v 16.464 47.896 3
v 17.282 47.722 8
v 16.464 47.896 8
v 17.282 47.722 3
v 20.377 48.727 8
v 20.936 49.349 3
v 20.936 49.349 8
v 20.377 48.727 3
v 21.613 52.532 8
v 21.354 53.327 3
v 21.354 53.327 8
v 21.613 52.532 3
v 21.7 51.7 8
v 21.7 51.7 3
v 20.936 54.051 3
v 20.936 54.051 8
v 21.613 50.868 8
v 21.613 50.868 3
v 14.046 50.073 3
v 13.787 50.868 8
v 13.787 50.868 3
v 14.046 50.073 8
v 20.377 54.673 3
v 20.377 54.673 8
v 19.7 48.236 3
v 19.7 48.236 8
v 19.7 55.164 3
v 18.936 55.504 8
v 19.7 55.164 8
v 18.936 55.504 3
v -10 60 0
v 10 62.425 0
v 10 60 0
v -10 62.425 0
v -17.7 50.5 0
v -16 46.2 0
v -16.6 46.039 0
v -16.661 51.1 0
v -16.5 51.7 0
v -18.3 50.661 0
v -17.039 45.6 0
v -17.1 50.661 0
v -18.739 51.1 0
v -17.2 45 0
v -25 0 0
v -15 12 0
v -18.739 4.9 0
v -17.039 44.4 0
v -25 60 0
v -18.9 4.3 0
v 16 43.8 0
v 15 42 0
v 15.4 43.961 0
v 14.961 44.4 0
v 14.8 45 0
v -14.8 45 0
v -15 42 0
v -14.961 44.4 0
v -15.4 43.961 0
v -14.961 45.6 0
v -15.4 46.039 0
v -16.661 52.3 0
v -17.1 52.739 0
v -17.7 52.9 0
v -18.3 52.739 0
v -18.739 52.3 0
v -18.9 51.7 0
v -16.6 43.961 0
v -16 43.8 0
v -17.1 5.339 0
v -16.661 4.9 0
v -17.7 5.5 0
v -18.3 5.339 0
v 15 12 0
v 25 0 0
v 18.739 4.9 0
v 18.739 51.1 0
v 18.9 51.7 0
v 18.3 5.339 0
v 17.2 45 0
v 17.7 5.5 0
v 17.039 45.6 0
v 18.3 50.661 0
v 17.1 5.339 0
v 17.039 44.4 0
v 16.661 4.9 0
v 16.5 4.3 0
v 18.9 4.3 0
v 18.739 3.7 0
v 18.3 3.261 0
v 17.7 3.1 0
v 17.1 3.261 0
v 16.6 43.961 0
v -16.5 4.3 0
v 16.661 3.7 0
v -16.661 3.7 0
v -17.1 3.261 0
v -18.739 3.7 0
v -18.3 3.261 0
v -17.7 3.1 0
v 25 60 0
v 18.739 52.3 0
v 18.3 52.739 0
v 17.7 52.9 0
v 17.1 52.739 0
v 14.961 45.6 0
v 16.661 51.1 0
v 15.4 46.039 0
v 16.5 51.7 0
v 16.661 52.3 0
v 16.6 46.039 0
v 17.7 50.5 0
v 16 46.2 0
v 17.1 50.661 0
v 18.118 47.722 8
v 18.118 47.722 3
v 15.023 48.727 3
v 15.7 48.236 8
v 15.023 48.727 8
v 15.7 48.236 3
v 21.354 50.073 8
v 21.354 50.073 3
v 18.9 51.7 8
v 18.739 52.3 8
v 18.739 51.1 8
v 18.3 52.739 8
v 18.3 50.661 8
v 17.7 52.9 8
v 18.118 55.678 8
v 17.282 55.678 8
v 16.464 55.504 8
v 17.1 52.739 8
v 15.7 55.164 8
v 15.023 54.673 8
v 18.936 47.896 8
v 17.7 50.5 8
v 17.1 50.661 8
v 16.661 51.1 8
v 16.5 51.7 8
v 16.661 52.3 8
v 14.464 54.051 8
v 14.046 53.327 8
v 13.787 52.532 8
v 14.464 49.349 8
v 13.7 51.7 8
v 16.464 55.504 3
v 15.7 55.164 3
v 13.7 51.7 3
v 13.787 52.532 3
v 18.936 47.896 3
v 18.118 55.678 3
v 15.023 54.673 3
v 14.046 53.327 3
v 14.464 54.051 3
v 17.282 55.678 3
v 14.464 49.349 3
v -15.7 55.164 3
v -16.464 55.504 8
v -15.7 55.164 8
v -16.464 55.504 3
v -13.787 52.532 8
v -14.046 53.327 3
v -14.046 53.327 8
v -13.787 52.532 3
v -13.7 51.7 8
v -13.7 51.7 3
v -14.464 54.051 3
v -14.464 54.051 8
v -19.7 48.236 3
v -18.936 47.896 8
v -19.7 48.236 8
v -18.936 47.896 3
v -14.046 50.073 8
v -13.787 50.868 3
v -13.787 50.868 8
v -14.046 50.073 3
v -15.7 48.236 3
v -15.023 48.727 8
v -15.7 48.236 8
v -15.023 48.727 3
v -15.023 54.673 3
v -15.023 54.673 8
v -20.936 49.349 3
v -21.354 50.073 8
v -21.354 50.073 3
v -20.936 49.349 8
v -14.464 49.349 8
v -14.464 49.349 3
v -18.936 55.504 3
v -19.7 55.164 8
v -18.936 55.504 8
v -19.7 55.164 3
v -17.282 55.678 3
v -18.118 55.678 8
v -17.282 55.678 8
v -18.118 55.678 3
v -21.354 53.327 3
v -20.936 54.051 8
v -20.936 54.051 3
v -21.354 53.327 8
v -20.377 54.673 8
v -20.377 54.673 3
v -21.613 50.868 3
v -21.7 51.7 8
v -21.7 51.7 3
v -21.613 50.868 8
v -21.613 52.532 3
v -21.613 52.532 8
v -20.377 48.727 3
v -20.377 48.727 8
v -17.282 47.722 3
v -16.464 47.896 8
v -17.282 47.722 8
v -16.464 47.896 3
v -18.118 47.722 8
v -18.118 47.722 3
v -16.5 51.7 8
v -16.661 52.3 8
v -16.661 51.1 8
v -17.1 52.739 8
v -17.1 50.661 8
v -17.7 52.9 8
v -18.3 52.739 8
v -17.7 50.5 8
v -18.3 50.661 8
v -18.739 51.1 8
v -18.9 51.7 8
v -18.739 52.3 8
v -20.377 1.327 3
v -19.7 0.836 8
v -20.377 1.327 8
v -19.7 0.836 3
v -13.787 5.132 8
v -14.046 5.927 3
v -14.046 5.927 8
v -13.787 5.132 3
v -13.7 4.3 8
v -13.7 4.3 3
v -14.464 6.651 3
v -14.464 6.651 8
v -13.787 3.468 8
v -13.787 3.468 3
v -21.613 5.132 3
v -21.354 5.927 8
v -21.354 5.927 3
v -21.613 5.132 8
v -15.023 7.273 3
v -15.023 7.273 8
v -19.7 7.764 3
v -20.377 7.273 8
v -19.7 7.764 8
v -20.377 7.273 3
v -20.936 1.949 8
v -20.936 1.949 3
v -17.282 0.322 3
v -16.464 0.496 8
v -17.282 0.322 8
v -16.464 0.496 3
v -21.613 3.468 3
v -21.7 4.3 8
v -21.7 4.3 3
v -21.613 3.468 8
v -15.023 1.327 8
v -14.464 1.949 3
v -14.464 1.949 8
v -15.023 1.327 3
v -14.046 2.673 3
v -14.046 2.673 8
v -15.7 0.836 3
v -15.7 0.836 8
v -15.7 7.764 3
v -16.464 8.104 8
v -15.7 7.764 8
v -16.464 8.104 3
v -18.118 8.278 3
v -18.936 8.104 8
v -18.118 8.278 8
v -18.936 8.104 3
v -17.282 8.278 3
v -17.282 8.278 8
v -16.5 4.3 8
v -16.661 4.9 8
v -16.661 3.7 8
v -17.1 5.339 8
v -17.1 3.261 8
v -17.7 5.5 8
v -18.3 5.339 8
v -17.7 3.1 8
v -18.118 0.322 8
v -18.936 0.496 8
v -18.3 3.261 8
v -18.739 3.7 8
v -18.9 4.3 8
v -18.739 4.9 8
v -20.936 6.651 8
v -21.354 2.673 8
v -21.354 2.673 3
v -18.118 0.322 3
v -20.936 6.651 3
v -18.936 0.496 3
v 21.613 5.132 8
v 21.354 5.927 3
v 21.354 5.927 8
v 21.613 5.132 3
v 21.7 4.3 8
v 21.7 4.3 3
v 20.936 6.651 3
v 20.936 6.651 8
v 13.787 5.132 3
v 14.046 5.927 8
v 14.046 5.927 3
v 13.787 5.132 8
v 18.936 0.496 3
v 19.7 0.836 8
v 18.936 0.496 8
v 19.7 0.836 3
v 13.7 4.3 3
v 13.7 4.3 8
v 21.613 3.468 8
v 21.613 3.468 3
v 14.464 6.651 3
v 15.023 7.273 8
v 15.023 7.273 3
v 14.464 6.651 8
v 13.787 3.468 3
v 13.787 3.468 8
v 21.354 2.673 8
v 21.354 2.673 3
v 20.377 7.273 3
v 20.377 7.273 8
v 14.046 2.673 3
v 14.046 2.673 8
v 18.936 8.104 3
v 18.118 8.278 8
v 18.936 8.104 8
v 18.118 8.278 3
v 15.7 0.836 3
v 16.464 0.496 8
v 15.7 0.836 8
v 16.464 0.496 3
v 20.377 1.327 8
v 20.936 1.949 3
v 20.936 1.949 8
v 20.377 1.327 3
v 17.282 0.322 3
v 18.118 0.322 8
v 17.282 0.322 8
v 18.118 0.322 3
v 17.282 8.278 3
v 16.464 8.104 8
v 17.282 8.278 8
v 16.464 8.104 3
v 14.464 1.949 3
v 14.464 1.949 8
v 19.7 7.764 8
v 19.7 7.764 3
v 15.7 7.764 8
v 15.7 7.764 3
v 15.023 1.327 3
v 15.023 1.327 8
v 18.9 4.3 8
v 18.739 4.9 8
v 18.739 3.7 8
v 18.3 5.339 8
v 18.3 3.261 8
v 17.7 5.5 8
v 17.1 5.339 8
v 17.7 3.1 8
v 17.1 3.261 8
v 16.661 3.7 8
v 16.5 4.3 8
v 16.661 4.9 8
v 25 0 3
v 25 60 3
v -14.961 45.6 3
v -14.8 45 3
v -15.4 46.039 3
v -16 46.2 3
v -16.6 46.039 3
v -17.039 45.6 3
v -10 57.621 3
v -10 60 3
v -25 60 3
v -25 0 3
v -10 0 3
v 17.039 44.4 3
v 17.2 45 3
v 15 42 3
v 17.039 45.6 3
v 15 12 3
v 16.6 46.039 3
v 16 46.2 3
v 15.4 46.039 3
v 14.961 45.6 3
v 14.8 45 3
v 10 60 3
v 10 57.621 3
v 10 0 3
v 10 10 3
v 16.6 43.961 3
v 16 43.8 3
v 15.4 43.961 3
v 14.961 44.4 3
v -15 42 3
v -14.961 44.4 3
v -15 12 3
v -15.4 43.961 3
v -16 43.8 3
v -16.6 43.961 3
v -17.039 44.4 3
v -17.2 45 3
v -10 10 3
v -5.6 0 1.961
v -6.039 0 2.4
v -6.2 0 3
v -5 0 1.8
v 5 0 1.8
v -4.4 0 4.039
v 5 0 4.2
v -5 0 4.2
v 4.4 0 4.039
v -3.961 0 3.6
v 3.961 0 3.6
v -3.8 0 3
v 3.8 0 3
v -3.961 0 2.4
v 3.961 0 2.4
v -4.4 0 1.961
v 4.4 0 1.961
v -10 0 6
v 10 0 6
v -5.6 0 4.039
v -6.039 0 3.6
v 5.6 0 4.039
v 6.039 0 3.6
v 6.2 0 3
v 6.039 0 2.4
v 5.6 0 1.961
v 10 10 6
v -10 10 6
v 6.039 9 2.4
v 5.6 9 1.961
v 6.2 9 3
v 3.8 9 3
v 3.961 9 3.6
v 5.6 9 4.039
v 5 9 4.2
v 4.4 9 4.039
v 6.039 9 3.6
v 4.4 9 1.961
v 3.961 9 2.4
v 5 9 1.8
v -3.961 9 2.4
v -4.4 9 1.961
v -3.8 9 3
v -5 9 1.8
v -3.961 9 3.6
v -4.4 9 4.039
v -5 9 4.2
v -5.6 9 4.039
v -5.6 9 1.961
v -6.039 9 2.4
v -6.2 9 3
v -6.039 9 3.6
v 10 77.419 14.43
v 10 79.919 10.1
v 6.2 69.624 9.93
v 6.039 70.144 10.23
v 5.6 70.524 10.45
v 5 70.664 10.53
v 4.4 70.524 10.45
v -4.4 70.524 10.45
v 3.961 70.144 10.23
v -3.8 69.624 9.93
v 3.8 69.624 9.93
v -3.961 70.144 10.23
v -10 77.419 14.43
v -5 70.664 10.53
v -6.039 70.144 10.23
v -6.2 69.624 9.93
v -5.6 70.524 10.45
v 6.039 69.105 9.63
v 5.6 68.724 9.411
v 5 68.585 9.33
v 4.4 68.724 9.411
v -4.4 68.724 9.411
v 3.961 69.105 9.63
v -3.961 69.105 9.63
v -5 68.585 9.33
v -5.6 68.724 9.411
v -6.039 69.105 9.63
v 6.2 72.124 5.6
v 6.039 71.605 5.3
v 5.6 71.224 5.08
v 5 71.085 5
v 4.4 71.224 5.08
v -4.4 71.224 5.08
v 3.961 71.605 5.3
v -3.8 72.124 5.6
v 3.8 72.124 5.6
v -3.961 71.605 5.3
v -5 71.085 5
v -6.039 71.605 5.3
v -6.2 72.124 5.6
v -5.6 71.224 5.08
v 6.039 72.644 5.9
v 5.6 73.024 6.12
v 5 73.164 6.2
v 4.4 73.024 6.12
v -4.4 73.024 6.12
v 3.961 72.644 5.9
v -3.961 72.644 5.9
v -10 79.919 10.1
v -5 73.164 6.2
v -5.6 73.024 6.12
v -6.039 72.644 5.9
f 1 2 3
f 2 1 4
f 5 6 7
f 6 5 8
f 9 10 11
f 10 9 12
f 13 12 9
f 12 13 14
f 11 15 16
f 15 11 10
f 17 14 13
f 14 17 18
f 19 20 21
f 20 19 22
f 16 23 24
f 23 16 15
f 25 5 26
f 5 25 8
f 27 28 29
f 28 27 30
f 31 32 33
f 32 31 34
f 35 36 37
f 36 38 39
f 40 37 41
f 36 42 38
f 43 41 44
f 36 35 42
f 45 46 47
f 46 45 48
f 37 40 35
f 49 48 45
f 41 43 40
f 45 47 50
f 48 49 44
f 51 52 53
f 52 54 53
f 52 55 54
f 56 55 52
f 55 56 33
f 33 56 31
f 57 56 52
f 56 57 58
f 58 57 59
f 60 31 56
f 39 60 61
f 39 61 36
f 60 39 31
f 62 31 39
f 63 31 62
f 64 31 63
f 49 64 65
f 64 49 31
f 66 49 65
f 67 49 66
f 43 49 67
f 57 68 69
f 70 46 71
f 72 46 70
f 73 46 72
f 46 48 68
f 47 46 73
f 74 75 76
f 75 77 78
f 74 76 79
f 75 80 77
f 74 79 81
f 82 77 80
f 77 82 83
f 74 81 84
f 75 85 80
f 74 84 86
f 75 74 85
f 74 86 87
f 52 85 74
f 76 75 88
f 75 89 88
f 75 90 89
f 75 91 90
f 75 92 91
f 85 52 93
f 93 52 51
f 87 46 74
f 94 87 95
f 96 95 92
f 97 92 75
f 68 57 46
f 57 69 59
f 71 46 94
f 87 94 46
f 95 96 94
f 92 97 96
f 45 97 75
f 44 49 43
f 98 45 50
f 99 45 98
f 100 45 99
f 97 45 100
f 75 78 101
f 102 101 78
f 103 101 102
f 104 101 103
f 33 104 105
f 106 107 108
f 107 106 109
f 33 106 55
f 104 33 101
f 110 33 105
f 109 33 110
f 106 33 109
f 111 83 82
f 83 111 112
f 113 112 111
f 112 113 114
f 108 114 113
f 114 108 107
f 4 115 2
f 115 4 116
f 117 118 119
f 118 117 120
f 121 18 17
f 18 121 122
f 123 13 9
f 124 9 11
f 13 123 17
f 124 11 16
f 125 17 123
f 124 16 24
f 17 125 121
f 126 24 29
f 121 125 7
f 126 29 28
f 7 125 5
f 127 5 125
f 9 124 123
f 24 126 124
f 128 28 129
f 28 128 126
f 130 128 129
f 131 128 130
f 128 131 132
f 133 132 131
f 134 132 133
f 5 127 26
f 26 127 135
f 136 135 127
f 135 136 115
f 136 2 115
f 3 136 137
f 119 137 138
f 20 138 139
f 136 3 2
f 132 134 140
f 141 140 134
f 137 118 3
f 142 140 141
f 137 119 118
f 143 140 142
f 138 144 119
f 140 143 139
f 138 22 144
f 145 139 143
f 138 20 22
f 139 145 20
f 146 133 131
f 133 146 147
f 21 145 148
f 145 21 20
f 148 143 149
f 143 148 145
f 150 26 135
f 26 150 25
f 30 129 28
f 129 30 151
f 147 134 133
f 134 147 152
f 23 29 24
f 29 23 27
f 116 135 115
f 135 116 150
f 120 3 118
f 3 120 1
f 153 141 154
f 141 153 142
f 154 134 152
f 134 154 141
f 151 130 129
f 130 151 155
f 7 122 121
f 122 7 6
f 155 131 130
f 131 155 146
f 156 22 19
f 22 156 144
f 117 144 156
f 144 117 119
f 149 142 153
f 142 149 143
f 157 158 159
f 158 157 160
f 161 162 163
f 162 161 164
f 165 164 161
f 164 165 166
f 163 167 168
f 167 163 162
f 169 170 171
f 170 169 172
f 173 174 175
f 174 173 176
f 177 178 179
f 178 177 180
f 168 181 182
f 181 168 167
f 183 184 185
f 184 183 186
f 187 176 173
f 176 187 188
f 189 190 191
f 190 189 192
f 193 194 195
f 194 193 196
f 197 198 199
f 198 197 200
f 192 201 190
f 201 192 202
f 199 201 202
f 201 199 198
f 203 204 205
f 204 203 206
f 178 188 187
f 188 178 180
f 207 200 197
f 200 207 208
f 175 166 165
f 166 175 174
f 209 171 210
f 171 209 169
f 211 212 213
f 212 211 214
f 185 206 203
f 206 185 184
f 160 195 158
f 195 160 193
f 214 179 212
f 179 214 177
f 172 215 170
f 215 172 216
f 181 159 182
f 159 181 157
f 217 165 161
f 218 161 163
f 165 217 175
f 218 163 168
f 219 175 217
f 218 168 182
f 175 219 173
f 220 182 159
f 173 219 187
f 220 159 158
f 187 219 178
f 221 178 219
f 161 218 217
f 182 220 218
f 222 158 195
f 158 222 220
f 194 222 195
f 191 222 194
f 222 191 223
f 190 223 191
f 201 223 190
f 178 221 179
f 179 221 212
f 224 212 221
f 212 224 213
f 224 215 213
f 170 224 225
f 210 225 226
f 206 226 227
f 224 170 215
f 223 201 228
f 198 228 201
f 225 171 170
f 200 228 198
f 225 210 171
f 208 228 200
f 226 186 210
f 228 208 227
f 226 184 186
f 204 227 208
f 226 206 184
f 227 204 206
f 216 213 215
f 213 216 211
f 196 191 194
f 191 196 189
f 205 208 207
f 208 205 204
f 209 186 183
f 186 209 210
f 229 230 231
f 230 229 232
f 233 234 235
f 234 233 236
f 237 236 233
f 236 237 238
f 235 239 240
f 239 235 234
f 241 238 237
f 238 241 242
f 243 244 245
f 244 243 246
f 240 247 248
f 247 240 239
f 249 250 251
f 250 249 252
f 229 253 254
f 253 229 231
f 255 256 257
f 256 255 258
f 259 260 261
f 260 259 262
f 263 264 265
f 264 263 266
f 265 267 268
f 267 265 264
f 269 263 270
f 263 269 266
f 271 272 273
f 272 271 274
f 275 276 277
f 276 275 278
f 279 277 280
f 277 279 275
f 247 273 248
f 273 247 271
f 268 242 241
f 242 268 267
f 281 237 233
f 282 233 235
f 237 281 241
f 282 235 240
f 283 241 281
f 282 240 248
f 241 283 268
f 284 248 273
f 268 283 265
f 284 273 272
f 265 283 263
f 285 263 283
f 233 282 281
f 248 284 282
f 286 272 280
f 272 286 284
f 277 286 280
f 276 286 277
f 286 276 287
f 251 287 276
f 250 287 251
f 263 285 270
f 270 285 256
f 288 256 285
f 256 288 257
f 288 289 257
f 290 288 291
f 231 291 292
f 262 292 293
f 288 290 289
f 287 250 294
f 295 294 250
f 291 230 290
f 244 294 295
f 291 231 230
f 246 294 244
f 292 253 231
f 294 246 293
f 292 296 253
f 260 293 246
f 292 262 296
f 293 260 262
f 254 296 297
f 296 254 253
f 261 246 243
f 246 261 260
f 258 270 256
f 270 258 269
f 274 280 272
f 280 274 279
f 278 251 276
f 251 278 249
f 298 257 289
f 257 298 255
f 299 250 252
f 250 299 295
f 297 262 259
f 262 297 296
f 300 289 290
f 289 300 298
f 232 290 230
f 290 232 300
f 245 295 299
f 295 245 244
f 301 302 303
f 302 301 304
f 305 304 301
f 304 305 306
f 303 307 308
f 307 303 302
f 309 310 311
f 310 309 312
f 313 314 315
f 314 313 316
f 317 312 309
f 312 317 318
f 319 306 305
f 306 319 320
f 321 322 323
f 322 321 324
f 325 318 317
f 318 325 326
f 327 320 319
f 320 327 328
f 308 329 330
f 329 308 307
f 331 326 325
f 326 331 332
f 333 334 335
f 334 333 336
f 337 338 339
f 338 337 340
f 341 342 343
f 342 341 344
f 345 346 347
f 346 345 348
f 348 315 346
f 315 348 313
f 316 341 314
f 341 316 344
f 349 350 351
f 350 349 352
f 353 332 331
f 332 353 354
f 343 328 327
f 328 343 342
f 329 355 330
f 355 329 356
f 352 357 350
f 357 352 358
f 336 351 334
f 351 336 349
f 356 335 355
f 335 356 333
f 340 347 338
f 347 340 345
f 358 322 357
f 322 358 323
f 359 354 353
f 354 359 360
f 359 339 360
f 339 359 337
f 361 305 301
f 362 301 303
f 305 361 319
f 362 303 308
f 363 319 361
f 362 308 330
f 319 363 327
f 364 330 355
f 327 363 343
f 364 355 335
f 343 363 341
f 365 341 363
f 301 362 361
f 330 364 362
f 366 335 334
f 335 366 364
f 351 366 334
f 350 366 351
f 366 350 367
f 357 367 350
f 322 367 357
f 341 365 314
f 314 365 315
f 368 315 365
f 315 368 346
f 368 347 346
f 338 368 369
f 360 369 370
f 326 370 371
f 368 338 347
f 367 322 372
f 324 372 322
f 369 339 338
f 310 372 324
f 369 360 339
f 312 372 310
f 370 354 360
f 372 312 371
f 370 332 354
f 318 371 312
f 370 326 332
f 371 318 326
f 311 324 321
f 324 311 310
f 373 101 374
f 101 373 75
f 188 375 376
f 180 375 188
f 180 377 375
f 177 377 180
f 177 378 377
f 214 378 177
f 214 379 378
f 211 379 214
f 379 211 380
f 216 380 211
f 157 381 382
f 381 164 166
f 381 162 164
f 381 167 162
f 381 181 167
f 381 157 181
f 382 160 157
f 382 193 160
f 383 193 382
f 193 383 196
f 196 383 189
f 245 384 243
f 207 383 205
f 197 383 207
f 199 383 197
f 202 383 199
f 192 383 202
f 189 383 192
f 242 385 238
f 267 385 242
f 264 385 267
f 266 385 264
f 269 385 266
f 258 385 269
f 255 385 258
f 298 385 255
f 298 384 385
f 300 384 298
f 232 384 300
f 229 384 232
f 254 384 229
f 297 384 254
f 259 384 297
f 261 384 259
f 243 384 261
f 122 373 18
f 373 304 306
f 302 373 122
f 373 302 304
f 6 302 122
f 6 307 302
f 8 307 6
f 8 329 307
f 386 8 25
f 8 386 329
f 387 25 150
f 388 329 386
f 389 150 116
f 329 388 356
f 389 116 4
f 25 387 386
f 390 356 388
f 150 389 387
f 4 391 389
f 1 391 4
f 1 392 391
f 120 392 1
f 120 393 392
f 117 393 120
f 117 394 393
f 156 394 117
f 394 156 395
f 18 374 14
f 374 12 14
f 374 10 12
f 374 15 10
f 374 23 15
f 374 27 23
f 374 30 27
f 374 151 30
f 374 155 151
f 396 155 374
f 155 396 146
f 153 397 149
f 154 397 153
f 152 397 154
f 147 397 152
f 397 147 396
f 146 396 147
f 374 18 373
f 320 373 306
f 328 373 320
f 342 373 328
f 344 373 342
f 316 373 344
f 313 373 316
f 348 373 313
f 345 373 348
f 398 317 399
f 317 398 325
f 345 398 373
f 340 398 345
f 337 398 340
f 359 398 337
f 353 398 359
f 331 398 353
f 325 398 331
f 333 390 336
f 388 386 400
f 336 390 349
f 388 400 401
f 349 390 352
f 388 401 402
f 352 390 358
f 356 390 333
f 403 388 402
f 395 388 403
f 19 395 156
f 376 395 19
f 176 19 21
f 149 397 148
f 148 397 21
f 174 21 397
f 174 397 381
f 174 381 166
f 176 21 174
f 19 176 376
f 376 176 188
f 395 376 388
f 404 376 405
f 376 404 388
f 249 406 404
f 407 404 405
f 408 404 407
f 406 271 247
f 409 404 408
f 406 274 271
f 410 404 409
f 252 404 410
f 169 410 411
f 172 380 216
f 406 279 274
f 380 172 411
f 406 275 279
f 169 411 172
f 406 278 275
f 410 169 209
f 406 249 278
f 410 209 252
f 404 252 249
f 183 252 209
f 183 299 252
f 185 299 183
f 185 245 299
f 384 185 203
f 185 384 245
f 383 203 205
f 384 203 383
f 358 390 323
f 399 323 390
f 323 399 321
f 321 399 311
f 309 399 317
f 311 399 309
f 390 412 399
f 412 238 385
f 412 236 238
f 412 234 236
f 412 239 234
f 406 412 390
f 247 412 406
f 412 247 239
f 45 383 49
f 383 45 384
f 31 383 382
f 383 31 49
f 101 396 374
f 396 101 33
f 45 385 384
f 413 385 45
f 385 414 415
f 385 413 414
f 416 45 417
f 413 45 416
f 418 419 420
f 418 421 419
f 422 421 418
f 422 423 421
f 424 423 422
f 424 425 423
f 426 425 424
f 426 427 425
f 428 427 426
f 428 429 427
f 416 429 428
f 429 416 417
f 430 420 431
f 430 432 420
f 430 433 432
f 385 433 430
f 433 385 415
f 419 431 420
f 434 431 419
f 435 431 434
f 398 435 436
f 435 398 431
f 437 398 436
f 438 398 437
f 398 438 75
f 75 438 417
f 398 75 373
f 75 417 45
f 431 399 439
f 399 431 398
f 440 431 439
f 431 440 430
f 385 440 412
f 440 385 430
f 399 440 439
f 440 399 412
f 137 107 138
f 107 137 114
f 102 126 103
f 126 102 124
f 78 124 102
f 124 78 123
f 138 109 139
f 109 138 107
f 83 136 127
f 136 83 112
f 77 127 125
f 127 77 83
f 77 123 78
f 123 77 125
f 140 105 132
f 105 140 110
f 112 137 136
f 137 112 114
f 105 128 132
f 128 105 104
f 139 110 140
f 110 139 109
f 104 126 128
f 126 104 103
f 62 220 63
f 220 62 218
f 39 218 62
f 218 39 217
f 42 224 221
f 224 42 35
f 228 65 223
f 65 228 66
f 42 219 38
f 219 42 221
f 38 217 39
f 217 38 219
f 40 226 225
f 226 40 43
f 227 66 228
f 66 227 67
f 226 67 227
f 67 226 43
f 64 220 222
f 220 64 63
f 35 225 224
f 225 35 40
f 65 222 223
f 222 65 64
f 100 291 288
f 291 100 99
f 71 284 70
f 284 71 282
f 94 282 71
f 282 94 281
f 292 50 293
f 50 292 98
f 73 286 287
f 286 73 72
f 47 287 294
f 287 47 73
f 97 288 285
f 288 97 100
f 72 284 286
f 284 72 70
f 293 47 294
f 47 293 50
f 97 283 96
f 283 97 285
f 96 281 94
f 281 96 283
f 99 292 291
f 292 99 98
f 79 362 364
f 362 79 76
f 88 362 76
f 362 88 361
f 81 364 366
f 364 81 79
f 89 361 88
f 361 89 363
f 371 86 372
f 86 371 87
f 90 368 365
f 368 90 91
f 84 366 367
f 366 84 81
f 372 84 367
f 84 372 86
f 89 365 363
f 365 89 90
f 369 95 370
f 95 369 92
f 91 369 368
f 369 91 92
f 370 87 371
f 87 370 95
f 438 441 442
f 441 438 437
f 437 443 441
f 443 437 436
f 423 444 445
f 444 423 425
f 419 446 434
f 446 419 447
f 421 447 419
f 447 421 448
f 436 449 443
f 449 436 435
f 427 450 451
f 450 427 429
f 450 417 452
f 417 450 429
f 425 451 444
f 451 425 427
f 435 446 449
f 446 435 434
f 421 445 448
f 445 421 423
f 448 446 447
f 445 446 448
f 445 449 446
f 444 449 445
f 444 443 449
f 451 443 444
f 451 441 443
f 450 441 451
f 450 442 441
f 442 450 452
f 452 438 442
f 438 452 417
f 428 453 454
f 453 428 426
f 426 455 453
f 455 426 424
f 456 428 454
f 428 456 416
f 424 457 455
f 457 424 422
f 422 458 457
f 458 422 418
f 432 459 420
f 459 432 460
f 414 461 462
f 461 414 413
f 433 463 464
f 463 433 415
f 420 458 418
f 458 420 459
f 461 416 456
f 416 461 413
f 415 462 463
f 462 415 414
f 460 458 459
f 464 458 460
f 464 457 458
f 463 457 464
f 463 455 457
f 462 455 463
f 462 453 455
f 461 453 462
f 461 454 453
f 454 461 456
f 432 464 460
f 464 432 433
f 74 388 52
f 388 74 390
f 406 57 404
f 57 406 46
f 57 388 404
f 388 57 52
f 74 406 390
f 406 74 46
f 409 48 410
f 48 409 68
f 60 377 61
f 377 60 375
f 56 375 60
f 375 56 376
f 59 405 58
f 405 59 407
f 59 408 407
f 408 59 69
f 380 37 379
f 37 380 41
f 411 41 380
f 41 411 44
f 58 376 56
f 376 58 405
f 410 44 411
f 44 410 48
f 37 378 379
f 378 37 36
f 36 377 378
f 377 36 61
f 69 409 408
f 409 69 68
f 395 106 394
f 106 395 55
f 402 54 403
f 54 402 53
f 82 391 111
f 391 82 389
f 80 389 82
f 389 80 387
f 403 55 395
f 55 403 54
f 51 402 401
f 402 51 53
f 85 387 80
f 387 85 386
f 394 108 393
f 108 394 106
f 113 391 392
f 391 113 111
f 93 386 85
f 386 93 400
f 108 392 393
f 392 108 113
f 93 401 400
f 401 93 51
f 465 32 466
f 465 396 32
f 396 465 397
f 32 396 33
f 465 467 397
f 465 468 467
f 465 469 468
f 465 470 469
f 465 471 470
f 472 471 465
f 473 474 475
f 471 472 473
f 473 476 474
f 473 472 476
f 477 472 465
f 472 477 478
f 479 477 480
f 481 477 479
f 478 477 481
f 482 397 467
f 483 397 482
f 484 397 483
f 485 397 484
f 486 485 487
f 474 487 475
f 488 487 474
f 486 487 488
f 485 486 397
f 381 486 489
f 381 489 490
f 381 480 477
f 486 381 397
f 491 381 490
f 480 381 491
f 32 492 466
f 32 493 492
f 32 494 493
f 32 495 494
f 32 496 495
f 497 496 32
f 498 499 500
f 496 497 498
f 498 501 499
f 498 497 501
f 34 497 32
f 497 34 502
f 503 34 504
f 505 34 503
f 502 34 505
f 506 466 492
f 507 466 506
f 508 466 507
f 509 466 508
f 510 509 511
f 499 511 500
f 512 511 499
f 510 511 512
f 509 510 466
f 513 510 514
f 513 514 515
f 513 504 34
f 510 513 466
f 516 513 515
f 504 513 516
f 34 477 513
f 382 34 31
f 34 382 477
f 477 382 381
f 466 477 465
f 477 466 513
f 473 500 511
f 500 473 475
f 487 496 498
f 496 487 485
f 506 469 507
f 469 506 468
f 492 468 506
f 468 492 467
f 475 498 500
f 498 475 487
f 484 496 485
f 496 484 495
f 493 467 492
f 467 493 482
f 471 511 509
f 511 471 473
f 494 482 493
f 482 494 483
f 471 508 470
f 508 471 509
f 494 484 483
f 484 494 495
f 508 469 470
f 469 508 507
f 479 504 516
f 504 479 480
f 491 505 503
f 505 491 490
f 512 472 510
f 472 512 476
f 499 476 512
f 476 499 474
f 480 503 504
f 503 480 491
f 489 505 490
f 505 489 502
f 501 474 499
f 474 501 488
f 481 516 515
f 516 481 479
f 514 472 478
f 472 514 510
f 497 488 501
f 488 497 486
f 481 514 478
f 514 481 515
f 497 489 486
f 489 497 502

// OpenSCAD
$fn=12;
b=47.4;
h=35.4;

difference(){
union(){
translate([-25,0,0])cube([50,60,3]);
translate([-10,0,3])cube([20,10,3]);
translate([0,28,0]){
translate([h/2,b/2,0])cylinder(d=8,h=8,$fn=30);
translate([-h/2,b/2,0])cylinder(d=8,h=8,$fn=30);
translate([-h/2,-b/2,0])cylinder(d=8,h=8,$fn=30);
translate([h/2,-b/2,0])cylinder(d=8,h=8,$fn=30);
}    
}
translate([5,-1,3])rotate([-90,0,0])cylinder(d=2.4,h=10);
translate([-5,-1,3])rotate([-90,0,0])cylinder(d=2.4,h=10);
translate([-15,12,-1])cube(30);
translate([0,28,0])
{
translate([h/2,b/2,-1])cylinder(d=2.4,h=10,$fn=12);
translate([-h/2,b/2,-1])cylinder(d=2.4,h=10,$fn=12);
translate([-h/2,-b/2,-1])cylinder(d=2.4,h=10,$fn=12);
translate([h/2,-b/2,-1])cylinder(d=2.4,h=10,$fn=12);
}
translate([-16,45,-1])cylinder(d=2.4,h=10);
translate([16,45,-1])cylinder(d=2.4,h=10);
}

difference(){
translate([-10,60,-1.4])rotate([30,0,0])
difference(){
cube([20,23,5]);
translate([15,14,0])cylinder(d=2.4,h=6);
translate([5,14,0])cylinder(d=2.4,h=6);
}
translate([-25,0,-3])cube([50,70,3]);
}
